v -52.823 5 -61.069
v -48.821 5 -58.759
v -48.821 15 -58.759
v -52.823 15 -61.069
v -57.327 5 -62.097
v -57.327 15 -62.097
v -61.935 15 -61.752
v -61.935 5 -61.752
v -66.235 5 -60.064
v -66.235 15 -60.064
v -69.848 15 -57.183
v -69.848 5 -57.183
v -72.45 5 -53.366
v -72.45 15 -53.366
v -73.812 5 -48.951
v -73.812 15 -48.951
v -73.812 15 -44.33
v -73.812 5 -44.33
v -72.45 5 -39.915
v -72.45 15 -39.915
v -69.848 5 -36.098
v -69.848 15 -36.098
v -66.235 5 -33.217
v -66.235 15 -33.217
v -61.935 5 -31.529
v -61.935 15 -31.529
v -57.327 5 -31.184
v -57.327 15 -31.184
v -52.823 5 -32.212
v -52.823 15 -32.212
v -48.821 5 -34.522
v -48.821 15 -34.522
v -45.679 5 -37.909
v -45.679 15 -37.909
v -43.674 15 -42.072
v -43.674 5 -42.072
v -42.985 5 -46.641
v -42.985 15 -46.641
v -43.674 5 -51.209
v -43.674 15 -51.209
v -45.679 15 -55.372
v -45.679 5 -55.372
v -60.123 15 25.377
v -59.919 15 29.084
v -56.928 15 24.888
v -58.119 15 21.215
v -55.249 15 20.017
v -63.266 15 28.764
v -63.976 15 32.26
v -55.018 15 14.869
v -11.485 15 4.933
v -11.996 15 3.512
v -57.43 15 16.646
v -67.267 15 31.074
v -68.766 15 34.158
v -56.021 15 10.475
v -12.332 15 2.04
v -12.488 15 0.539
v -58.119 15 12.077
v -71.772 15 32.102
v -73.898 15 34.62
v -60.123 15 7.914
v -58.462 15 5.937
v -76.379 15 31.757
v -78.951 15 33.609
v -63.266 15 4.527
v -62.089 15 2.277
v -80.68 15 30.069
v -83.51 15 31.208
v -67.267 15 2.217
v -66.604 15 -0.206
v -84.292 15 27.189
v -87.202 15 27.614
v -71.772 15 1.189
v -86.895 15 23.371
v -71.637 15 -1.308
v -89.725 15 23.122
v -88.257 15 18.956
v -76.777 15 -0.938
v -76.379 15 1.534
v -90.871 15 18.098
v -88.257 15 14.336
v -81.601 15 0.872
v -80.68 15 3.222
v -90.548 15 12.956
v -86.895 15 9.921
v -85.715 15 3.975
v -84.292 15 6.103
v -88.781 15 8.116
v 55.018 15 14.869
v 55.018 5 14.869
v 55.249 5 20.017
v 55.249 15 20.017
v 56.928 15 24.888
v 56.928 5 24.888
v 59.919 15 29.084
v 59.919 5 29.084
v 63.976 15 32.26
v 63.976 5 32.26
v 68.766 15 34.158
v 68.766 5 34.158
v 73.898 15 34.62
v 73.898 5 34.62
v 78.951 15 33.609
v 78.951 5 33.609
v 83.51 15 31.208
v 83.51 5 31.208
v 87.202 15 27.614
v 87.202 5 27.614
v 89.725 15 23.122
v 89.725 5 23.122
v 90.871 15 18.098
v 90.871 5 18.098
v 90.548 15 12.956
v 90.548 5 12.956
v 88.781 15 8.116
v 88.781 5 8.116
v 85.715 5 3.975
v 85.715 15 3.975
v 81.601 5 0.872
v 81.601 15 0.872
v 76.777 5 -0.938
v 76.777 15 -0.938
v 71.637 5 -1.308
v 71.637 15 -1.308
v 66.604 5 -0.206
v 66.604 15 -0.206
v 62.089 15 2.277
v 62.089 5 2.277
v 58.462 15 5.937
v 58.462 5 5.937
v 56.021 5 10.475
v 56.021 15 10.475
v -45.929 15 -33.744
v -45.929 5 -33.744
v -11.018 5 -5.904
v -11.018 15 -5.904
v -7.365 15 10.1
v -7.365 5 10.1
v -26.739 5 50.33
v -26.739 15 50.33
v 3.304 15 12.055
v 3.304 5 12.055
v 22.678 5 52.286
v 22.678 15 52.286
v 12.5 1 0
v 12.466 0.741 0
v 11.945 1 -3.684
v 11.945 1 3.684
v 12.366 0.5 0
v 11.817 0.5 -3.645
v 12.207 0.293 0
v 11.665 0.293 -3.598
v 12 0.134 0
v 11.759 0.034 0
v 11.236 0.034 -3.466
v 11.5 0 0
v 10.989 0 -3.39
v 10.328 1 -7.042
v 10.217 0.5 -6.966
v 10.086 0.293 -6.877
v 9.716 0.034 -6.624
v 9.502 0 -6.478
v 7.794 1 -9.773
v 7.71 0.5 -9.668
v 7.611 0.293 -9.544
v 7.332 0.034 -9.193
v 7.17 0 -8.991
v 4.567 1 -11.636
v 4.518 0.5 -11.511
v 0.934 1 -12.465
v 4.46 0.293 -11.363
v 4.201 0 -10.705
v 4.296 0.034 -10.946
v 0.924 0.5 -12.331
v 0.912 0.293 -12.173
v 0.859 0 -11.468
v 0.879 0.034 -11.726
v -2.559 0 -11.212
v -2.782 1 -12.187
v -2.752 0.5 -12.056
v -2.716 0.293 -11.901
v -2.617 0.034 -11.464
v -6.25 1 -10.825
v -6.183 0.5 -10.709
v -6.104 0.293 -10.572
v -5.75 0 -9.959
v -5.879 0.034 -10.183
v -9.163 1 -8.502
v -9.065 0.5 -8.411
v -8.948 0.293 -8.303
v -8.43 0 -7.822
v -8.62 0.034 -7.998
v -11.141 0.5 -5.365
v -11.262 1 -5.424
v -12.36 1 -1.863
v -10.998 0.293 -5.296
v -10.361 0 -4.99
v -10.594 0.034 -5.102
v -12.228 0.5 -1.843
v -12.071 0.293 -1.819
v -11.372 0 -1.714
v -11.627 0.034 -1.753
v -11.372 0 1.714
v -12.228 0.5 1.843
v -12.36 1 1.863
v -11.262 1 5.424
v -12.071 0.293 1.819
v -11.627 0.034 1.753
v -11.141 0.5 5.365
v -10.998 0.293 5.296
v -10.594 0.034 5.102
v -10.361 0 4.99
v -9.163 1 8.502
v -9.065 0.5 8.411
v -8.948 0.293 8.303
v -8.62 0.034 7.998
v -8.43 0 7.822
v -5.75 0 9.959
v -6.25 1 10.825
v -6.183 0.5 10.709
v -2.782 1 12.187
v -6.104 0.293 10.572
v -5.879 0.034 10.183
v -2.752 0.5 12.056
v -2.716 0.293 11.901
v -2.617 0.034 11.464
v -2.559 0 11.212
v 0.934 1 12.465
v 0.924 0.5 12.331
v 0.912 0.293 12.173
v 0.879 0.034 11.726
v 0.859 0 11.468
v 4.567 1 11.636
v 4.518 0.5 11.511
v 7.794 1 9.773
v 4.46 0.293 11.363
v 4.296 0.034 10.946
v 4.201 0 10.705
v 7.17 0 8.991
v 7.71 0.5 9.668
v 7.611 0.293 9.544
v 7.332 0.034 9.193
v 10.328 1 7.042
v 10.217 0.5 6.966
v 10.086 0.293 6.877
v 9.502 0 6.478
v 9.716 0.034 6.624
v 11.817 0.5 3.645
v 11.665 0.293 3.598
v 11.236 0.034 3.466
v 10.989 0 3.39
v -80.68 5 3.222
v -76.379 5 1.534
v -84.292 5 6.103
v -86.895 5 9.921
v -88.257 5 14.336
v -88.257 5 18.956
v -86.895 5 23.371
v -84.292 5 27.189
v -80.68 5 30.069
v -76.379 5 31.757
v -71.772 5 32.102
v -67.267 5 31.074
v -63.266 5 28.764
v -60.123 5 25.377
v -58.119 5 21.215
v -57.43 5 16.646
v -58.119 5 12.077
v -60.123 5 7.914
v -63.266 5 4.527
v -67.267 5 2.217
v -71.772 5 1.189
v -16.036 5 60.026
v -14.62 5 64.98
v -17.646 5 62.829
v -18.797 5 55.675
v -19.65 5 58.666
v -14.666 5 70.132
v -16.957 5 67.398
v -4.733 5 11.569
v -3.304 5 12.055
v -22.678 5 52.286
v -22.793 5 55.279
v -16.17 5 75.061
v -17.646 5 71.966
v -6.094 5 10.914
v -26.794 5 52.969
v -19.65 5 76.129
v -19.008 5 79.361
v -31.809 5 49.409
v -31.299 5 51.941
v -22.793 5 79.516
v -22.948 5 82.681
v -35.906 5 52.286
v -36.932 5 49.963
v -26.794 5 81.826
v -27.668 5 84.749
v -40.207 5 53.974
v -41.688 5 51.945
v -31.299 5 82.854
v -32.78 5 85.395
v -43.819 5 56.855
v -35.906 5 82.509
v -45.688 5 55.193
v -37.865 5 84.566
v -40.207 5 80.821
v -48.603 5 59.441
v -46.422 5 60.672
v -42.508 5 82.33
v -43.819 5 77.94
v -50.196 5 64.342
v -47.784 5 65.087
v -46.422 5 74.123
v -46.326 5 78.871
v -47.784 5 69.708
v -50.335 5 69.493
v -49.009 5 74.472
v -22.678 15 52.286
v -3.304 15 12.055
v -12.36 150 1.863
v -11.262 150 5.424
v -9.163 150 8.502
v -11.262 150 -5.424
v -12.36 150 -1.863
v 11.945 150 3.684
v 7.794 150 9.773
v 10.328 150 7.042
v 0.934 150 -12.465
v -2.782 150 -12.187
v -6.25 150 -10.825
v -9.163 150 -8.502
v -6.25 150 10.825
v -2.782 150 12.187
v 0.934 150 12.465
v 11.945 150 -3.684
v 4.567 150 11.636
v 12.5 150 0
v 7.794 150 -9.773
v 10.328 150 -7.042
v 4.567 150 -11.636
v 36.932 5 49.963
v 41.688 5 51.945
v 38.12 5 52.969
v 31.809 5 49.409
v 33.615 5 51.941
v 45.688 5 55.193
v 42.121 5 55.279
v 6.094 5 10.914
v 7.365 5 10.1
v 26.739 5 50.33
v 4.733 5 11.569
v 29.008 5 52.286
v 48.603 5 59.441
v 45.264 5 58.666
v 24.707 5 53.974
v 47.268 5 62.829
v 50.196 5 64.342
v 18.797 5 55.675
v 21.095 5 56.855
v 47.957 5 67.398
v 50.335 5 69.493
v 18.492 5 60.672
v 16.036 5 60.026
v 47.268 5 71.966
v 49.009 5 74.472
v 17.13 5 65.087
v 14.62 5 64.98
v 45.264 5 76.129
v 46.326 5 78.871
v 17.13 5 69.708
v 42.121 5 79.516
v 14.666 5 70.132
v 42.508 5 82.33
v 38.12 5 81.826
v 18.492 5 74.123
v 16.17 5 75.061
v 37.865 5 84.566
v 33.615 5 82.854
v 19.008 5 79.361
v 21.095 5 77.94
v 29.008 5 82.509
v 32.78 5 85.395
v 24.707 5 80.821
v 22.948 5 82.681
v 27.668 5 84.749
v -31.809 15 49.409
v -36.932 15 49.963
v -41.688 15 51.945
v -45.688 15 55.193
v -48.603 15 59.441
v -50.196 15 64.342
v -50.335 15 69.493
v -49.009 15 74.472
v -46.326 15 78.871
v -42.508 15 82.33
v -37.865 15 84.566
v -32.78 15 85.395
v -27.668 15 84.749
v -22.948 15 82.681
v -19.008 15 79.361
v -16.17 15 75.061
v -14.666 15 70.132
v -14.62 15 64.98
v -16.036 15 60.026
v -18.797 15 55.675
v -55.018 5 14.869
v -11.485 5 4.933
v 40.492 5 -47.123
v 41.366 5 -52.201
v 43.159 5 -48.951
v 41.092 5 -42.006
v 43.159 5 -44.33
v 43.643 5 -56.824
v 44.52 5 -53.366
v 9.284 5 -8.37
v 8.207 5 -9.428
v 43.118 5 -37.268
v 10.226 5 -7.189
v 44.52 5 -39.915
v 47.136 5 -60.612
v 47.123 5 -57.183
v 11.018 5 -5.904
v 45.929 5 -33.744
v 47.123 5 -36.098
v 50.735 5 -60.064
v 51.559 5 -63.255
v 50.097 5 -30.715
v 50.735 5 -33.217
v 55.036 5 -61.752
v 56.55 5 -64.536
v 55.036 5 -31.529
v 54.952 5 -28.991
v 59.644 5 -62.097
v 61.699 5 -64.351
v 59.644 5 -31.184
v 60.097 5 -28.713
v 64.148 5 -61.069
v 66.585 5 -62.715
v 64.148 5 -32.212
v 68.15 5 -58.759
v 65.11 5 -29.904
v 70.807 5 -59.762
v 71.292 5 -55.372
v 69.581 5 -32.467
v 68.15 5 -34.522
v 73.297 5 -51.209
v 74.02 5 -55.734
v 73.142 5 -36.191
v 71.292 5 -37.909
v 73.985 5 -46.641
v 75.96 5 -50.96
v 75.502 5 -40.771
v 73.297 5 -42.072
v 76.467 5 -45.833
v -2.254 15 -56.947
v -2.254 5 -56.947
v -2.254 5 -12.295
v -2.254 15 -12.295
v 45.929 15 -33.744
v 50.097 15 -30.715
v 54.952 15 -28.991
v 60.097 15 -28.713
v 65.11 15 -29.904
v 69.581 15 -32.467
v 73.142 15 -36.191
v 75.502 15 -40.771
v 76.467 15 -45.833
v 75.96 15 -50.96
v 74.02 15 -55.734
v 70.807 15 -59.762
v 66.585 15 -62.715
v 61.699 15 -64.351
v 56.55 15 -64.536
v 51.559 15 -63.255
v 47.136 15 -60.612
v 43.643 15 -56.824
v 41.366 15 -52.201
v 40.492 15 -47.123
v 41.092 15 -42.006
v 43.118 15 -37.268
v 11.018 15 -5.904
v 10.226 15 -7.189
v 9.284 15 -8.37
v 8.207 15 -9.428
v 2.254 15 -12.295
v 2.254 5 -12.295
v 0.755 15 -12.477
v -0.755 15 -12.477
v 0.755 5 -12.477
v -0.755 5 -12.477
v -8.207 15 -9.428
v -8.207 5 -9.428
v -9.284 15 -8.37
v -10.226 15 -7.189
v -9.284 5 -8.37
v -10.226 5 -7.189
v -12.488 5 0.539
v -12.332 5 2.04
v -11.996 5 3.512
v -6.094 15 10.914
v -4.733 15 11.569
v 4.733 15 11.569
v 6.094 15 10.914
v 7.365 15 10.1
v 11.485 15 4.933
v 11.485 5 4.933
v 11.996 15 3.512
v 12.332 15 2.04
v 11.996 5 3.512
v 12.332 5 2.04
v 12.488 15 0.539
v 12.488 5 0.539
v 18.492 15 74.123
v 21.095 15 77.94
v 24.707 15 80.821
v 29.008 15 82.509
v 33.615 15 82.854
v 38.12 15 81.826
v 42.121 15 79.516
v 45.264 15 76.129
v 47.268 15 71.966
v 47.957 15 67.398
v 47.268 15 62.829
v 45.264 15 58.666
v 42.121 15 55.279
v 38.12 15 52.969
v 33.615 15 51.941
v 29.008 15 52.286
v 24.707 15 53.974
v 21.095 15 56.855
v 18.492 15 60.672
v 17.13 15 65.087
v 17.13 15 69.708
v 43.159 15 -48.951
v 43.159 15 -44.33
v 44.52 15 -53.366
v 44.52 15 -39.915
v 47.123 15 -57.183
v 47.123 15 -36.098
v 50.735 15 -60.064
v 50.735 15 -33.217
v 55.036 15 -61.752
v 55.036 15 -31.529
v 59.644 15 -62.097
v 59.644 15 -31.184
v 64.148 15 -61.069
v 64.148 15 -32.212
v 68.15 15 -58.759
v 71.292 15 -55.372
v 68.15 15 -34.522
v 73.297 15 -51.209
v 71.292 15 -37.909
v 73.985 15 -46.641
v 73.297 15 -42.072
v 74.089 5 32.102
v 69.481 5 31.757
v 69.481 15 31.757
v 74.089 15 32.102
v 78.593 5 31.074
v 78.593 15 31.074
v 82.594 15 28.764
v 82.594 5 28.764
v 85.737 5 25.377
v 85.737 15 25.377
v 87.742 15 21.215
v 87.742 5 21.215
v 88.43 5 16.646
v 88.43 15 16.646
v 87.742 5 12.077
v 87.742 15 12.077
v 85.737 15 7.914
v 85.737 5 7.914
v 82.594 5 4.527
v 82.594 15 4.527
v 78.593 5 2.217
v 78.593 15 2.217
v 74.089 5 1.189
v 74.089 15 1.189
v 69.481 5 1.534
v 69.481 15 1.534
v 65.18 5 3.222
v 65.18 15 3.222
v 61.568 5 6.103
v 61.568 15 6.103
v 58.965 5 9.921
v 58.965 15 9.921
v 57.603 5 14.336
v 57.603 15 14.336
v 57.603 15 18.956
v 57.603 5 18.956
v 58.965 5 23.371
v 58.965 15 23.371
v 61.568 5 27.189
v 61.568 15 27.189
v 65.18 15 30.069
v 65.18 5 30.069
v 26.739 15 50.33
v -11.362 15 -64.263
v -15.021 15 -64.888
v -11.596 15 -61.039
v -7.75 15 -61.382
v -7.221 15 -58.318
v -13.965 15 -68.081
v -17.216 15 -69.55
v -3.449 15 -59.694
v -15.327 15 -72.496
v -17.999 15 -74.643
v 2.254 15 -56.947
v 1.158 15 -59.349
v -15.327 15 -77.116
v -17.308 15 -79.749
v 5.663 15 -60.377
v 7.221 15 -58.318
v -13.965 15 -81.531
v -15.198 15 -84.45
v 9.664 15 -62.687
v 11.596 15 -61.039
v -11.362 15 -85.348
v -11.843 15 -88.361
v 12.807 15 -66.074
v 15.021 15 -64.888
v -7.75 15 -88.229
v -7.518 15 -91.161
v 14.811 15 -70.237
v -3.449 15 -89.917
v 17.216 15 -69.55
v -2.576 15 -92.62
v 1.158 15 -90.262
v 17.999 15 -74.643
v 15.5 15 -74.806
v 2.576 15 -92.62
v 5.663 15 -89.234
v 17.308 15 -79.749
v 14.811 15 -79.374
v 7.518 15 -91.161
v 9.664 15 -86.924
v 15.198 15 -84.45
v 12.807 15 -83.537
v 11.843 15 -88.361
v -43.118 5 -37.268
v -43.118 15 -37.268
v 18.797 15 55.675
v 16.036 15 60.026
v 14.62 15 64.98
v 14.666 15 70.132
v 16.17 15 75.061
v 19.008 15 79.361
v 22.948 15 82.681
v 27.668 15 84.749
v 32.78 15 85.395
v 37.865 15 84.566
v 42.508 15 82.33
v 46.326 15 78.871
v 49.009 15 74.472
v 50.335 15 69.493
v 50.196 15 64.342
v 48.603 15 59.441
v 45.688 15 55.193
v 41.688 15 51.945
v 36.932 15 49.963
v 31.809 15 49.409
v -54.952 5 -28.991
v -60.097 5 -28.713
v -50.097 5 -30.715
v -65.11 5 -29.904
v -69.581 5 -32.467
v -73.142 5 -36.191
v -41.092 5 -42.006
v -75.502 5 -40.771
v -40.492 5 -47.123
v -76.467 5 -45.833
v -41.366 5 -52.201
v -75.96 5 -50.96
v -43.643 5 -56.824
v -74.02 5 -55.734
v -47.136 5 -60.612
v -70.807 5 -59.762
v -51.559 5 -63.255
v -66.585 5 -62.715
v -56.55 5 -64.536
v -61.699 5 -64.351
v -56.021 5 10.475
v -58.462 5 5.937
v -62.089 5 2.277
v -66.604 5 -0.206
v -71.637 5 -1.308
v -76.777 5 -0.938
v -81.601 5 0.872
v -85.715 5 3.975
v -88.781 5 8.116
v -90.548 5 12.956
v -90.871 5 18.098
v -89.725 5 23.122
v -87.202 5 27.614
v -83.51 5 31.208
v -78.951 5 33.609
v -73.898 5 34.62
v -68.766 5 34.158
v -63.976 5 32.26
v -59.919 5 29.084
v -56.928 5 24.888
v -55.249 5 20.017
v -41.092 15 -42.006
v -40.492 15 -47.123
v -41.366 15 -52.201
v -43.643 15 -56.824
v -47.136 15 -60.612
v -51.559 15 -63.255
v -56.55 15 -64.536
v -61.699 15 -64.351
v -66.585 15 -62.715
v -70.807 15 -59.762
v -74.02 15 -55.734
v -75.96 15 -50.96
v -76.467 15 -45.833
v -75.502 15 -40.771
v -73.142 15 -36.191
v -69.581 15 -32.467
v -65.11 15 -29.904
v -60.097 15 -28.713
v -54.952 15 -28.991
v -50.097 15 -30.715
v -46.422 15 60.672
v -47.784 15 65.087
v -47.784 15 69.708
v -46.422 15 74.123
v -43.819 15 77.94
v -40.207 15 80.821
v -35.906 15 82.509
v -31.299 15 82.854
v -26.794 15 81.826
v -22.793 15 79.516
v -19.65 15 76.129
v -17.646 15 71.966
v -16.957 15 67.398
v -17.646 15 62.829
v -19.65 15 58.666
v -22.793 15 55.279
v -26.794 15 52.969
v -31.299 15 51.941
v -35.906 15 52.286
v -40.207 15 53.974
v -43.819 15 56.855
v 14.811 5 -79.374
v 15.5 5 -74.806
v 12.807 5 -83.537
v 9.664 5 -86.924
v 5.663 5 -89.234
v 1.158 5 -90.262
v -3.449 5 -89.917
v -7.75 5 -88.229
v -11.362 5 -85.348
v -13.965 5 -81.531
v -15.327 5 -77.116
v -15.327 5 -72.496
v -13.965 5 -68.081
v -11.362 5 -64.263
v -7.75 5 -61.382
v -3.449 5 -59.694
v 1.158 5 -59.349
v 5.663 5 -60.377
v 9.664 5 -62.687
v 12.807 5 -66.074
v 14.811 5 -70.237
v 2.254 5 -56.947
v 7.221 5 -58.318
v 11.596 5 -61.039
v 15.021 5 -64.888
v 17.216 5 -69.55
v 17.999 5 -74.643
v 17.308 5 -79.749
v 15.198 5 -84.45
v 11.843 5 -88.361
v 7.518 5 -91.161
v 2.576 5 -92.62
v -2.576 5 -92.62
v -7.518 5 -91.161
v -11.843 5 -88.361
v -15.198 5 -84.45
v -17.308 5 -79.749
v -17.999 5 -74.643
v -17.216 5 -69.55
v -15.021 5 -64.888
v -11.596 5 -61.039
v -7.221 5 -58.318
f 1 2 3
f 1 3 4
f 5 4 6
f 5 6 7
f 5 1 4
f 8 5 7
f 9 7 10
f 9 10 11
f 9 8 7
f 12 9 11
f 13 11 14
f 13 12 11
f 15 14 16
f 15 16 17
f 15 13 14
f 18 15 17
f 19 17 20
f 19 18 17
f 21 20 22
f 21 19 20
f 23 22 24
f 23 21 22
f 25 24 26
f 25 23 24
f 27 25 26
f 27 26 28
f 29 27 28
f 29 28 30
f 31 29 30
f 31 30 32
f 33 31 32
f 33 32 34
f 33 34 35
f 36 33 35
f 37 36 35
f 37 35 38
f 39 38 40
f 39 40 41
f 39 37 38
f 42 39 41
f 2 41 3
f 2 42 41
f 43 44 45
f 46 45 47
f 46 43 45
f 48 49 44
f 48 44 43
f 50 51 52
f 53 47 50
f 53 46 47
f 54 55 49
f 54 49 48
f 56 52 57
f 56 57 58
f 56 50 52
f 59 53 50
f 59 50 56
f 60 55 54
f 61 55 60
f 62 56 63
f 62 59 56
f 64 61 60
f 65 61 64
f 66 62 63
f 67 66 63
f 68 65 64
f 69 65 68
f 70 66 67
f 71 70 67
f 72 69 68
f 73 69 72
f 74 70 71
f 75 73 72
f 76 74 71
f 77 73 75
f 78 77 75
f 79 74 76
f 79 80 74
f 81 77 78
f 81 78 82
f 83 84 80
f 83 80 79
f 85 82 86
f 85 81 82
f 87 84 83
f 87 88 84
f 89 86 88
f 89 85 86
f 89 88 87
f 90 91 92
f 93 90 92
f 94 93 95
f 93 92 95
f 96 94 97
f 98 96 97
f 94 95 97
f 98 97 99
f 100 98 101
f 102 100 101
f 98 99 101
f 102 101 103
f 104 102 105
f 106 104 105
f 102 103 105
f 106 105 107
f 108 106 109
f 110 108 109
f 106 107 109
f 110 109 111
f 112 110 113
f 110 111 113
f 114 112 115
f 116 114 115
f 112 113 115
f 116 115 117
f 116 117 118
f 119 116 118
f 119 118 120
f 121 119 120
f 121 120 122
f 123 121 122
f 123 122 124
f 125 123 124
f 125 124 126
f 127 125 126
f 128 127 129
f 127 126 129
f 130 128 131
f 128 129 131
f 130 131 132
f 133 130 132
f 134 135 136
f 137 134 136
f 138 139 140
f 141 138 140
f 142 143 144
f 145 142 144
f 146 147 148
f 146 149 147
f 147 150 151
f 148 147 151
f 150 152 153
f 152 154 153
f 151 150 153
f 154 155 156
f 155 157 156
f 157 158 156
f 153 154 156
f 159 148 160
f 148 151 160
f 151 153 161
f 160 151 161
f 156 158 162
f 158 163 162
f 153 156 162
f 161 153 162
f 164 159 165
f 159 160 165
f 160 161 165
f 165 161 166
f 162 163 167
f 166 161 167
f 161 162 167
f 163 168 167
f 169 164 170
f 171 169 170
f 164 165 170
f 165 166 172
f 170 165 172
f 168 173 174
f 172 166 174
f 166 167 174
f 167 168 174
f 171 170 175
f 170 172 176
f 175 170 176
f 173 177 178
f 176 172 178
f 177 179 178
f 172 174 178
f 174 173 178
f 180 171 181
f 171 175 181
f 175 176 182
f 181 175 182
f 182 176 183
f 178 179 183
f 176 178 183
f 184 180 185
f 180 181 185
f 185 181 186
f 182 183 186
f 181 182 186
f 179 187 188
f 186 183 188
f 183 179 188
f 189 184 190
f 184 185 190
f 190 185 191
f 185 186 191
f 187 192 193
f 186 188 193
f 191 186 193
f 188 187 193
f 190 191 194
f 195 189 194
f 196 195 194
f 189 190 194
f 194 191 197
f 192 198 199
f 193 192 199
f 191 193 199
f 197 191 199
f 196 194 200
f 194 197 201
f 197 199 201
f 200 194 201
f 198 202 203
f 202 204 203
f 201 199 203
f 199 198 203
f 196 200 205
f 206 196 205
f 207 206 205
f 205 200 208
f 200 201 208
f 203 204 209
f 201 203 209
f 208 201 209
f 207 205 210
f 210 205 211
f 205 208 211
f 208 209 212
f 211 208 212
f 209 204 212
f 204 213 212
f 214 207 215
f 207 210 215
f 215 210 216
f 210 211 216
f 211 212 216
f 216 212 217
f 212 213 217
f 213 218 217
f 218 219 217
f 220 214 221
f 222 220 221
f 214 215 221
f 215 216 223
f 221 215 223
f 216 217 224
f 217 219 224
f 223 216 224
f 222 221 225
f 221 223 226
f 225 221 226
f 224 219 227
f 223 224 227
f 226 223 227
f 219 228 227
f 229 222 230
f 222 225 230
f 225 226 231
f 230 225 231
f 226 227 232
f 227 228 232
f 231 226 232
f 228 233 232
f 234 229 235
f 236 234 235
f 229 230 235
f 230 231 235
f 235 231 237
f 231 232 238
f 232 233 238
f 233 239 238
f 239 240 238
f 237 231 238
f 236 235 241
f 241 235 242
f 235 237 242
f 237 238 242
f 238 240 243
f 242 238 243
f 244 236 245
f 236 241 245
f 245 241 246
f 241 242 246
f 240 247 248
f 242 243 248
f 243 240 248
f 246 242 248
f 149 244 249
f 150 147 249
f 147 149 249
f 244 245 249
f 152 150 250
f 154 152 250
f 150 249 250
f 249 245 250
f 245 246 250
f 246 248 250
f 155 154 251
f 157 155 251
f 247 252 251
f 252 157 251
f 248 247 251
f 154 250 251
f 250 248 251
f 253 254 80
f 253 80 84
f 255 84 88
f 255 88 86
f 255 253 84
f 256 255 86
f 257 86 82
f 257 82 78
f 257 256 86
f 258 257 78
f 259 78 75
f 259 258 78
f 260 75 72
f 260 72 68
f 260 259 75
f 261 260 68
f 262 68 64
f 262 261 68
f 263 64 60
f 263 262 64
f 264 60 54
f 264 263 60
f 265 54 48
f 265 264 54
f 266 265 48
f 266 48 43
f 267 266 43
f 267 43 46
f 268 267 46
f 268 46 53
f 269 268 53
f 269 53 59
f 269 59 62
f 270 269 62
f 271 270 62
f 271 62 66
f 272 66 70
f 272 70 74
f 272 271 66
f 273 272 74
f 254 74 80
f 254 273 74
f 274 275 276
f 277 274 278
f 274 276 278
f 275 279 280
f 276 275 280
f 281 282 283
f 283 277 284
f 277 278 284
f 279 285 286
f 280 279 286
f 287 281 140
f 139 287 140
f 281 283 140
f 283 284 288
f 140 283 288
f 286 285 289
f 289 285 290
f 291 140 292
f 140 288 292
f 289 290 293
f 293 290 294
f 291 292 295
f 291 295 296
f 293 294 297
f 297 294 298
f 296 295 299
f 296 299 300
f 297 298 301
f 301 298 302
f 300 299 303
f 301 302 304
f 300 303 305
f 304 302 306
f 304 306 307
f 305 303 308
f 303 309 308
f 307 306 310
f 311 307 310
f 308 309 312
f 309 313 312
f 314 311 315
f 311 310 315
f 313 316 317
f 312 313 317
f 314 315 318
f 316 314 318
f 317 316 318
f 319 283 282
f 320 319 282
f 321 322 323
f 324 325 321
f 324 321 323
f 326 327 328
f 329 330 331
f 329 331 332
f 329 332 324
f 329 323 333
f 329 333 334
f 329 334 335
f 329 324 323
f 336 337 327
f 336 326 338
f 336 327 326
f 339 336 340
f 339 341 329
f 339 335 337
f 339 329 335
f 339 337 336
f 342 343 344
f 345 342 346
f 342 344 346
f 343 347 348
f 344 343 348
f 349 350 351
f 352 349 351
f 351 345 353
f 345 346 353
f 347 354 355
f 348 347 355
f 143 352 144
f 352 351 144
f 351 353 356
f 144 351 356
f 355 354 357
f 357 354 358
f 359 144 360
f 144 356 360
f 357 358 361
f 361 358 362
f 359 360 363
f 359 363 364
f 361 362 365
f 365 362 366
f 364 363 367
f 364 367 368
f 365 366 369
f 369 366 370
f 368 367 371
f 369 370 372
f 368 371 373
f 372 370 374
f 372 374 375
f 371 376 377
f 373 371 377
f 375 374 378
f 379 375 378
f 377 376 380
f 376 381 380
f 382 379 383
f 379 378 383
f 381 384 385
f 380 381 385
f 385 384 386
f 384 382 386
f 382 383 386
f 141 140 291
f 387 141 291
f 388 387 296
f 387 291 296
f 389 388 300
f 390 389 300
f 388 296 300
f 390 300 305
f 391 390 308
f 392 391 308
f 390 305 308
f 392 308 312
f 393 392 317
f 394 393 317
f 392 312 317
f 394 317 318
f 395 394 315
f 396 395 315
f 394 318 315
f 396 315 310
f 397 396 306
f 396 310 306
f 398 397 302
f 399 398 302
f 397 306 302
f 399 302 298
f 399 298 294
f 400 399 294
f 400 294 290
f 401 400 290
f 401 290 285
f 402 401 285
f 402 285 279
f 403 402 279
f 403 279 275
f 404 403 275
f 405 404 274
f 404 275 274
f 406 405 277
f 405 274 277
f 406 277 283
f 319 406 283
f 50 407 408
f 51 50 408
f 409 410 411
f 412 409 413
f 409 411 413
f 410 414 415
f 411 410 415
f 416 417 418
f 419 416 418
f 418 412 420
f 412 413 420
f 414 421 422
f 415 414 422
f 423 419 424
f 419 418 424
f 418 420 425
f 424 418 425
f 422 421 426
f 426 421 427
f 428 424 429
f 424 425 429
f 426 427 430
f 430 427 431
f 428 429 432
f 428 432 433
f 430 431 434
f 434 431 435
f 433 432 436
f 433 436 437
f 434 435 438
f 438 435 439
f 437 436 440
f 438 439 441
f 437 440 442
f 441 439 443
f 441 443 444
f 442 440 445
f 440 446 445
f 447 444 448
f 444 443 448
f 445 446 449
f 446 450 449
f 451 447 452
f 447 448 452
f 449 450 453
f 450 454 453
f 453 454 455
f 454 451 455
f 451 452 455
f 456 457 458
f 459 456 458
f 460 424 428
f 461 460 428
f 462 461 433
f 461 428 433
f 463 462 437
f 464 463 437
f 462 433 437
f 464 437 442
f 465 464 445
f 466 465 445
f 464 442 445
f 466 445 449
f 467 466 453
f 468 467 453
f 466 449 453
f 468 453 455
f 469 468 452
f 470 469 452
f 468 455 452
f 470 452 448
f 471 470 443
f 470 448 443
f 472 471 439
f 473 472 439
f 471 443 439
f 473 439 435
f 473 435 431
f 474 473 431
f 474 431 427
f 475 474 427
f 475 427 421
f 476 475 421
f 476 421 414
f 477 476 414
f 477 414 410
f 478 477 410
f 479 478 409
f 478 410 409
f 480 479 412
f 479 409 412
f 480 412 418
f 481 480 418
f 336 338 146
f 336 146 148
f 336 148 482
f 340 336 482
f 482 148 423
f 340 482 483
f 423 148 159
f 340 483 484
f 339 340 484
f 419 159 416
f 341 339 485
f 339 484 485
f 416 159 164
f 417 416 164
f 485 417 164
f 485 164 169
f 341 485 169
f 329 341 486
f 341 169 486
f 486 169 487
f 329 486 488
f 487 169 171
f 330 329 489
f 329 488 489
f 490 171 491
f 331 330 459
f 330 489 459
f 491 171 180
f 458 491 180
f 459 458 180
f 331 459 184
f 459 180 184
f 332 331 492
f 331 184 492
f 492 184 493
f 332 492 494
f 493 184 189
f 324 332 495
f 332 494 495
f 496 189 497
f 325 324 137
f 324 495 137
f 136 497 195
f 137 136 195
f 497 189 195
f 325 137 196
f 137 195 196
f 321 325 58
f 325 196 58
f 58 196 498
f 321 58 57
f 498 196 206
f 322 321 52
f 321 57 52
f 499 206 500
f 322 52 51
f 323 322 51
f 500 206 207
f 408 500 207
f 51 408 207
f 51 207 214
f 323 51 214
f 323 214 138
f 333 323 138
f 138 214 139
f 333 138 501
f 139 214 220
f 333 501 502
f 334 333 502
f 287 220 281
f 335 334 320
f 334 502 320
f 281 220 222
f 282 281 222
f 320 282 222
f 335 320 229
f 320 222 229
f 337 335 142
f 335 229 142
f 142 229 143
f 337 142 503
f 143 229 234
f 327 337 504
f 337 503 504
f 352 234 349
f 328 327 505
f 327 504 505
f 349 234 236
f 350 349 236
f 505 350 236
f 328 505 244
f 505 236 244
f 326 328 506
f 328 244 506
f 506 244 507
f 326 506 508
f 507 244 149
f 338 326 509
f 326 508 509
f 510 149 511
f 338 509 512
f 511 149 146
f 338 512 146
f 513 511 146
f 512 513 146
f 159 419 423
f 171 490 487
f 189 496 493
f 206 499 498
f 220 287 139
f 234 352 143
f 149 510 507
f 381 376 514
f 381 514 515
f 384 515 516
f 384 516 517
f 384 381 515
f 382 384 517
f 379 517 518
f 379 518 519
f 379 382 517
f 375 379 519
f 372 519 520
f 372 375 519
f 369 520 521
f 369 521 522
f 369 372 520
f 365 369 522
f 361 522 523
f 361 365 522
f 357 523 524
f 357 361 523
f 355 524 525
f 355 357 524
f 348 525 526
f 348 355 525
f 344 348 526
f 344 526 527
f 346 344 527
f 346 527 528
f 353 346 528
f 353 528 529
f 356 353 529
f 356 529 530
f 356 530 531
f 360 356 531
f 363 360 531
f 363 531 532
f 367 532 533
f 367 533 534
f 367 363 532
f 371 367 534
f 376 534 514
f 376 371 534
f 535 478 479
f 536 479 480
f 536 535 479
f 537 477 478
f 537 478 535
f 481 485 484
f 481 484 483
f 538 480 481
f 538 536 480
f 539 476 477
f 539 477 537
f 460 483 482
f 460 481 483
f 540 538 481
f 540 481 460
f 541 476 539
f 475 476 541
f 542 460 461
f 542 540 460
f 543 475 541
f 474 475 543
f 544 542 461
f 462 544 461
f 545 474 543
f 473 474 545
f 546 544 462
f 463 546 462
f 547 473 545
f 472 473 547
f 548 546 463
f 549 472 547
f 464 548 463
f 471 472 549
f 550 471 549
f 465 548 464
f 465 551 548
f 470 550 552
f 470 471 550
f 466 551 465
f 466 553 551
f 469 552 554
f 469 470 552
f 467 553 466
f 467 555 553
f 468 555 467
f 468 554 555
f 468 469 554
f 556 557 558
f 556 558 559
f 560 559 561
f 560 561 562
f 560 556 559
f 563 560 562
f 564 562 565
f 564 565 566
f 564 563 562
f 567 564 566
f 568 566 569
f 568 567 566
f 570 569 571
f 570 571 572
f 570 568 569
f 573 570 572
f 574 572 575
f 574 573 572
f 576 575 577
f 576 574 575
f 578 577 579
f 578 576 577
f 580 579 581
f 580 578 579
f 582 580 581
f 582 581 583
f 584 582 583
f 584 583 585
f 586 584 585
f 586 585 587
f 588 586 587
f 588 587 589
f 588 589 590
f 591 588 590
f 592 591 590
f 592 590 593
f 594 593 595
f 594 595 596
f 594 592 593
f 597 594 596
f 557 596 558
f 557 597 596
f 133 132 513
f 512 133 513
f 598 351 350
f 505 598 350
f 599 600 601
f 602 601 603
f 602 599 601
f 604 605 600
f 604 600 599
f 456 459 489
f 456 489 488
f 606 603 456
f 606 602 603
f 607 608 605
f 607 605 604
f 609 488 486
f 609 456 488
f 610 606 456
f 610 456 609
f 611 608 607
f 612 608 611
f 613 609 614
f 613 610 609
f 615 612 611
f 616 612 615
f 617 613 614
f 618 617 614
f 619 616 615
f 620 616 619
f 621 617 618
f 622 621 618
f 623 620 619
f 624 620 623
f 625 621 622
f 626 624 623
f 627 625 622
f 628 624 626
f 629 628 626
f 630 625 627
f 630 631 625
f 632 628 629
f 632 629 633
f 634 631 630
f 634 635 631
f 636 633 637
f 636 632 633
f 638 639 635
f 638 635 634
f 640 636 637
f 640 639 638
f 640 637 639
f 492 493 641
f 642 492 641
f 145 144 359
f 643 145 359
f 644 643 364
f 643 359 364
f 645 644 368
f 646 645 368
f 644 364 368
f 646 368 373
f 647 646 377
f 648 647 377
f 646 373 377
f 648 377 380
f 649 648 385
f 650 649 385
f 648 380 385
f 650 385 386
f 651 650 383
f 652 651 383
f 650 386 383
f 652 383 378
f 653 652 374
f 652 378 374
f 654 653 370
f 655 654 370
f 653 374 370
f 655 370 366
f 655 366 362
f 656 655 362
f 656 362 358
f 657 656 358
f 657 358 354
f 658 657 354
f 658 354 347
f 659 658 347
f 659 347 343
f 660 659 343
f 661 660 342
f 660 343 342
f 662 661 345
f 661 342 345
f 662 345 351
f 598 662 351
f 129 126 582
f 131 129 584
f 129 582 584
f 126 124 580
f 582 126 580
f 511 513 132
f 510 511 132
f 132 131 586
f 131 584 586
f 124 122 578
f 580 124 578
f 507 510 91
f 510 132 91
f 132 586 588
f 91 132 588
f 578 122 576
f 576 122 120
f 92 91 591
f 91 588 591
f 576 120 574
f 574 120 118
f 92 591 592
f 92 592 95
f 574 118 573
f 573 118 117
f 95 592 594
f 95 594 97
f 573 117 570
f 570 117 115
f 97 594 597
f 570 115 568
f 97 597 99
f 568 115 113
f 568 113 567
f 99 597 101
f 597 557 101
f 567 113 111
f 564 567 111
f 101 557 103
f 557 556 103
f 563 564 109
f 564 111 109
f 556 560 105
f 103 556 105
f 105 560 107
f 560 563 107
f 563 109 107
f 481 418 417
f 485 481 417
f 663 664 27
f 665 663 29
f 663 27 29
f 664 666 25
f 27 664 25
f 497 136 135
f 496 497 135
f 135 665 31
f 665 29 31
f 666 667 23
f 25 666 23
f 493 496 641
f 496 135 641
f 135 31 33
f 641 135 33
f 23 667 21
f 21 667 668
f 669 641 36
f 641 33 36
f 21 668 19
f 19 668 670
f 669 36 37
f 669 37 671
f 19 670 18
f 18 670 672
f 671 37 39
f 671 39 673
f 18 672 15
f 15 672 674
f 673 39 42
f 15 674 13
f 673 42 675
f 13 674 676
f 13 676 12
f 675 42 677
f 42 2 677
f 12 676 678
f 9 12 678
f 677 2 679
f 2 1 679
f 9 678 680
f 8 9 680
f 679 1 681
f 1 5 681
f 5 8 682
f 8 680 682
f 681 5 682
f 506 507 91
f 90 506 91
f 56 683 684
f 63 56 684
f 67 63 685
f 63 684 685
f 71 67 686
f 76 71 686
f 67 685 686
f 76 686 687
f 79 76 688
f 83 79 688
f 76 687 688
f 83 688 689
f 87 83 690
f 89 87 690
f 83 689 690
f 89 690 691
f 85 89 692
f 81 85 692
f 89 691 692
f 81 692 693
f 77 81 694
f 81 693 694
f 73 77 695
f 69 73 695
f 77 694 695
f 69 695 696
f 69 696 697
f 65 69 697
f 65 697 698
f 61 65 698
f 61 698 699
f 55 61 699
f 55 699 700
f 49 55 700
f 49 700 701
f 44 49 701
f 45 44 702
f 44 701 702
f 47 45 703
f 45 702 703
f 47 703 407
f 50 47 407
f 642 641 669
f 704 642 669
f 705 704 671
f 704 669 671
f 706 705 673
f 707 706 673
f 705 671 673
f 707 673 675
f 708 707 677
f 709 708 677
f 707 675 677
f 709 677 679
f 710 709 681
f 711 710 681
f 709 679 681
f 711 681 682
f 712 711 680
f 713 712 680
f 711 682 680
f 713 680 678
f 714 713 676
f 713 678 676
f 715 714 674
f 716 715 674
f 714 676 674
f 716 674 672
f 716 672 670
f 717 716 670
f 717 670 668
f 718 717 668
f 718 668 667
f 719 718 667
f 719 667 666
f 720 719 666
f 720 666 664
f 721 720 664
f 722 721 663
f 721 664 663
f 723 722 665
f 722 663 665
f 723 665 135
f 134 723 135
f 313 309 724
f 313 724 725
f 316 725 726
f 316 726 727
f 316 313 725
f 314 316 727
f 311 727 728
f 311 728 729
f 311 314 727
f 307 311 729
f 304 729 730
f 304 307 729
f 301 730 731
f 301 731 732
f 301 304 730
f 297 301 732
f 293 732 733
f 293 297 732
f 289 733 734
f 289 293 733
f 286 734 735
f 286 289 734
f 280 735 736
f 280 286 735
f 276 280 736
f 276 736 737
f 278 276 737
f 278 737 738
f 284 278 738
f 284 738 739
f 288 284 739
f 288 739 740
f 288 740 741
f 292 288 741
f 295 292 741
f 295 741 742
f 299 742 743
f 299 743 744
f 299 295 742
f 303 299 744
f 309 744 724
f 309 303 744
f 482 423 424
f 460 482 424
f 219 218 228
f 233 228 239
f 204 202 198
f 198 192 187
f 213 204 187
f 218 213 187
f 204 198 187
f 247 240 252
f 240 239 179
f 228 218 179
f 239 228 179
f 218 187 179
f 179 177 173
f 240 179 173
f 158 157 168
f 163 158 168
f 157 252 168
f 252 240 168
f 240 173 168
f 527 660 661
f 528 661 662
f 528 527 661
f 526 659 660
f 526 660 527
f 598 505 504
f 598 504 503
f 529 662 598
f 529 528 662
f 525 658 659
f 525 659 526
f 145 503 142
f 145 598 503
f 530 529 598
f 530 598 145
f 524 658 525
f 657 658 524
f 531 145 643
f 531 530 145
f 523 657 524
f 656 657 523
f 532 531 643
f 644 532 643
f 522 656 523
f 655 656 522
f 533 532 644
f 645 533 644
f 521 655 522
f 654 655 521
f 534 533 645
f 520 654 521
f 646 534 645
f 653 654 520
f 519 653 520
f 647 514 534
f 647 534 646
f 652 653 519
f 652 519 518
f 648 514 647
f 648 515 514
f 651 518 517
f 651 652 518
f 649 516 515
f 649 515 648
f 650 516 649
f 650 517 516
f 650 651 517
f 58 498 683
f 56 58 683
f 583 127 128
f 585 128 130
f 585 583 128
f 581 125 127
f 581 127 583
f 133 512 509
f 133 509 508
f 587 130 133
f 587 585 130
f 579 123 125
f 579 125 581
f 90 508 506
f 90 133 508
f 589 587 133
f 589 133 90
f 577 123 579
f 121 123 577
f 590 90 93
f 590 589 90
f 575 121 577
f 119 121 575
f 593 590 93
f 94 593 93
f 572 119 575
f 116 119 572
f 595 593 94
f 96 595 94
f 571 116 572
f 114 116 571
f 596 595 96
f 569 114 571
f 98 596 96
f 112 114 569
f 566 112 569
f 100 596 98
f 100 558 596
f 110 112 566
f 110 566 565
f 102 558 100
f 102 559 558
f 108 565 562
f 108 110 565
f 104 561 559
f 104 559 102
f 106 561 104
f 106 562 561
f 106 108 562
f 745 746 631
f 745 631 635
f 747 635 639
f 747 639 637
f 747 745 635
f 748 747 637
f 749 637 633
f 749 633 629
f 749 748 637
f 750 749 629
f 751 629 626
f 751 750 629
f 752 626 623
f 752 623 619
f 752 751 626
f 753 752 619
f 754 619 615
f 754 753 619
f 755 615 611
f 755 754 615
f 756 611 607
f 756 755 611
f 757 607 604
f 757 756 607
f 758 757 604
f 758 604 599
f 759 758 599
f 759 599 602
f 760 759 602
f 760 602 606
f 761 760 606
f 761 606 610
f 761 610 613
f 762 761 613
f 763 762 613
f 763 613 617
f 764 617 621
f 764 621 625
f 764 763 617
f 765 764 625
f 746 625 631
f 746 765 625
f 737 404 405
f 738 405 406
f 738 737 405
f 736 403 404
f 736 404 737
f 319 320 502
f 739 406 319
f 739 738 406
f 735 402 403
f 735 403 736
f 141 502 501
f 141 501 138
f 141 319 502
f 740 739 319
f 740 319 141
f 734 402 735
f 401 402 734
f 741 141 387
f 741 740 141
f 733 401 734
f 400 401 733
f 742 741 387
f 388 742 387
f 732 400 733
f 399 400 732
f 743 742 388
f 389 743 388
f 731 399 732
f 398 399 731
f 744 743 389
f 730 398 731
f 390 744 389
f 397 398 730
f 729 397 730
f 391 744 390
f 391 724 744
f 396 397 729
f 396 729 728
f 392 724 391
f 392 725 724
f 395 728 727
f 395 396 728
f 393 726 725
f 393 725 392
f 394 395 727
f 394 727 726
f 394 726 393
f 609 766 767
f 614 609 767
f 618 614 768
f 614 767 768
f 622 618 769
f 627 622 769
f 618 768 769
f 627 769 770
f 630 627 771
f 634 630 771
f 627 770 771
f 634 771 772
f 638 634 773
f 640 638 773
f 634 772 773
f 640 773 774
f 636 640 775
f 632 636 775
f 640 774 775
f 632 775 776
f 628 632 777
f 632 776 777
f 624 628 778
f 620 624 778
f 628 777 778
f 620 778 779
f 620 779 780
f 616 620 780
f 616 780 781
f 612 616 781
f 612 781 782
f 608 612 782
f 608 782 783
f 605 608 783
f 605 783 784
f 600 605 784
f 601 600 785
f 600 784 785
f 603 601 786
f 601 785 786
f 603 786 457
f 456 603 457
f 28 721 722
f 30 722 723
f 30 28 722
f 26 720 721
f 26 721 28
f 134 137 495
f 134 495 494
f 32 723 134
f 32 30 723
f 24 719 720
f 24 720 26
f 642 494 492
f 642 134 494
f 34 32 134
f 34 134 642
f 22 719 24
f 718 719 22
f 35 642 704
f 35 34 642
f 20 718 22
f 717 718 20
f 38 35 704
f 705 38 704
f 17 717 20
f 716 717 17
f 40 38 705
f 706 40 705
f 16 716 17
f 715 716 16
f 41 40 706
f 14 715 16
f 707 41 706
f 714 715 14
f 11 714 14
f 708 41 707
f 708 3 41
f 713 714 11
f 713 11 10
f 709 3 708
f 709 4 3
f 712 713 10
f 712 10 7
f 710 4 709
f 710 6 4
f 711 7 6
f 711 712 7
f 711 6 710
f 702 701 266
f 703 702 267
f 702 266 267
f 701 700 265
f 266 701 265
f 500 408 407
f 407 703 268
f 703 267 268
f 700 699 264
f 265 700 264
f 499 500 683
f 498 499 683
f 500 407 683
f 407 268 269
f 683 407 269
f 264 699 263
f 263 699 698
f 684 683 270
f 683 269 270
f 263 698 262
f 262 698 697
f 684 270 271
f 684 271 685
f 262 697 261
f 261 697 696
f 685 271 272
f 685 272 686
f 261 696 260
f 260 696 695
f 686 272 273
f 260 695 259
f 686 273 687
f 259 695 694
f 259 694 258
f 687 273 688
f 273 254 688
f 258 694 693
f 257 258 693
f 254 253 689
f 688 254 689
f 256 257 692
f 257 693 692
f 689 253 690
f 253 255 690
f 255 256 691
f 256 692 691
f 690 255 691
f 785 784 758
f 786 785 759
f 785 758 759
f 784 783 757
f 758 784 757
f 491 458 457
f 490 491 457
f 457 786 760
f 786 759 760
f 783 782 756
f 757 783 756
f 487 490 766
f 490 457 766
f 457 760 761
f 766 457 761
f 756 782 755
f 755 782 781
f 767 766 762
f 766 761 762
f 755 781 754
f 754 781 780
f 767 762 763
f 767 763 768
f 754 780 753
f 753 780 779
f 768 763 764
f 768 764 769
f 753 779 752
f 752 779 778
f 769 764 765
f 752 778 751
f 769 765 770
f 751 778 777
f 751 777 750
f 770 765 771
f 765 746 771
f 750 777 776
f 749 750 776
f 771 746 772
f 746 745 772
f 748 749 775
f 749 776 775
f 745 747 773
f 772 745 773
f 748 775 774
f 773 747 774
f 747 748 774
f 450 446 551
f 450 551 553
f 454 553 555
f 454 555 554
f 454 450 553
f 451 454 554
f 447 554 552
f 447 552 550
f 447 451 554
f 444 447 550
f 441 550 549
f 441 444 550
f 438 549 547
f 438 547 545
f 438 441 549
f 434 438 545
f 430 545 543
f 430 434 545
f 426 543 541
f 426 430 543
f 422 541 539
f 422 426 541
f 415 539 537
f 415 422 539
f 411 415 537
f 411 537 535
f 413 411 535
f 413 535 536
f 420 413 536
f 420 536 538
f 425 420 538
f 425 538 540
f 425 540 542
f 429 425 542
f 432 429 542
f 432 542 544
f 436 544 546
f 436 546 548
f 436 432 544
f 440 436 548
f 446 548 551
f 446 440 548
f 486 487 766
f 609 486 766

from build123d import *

# Parameters (mm, degrees)
SKETCH1_R           = 12.5
BOSS_EXTRUDE1_DEPTH = 150
BOSS_EXTRUDE2_START = 5
SKETCH3_R           = 15.5
BOSS_EXTRUDE2_DEPTH = 10
CIRPATTERN1_COUNT   = 7
FILLET1_R           = 1


with BuildPart() as part:
    # Sketch1 → Boss-Extrude1 (new body)
    with BuildSketch(Plane(origin=(0, 0, 0), x_dir=(1, 0, 0), z_dir=(0, 1, 0))):
        Circle(SKETCH1_R)
    extrude(amount=BOSS_EXTRUDE1_DEPTH)

    # Sketch3 → Boss-Extrude2 (add)
    with BuildSketch(Plane(origin=(0, 0, 0), x_dir=(1, 0, 0), z_dir=(0, 1, 0)).offset(BOSS_EXTRUDE2_START)):
        with BuildLine():
            Line((-2.253835774, 56.947383215), (-2.253835774, 12.295130105))
            Line((-2.253835774, 12.295130105), (2.253835774, 12.295130105))
            Line((2.253835774, 12.295130105), (2.253835774, 56.947383215))
            ThreePointArc((2.253835774, 56.947383215), (0, 92.805720885), (-2.253835774, 56.947383215))
        make_face()
        with Locations((0, 74.805720885)):
            Circle(SKETCH3_R, mode=Mode.SUBTRACT)
    boss_extrude2 = extrude(amount=BOSS_EXTRUDE2_DEPTH)

    # CirPattern1: Boss-Extrude2 ×7 about axis
    cirpattern1_axis = Axis((0, 0, 0), (0, 1, 0))
    for i in range(1, CIRPATTERN1_COUNT):
        add(boss_extrude2.rotate(cirpattern1_axis, i * 360 / CIRPATTERN1_COUNT))

    # Fillet1
    fillet1_edges = [part.edges().sort_by_distance(p)[0] for p in [
        (-12.5, 0, 0),
    ]]
    fillet(fillet1_edges, radius=FILLET1_R)


solid = part.part
